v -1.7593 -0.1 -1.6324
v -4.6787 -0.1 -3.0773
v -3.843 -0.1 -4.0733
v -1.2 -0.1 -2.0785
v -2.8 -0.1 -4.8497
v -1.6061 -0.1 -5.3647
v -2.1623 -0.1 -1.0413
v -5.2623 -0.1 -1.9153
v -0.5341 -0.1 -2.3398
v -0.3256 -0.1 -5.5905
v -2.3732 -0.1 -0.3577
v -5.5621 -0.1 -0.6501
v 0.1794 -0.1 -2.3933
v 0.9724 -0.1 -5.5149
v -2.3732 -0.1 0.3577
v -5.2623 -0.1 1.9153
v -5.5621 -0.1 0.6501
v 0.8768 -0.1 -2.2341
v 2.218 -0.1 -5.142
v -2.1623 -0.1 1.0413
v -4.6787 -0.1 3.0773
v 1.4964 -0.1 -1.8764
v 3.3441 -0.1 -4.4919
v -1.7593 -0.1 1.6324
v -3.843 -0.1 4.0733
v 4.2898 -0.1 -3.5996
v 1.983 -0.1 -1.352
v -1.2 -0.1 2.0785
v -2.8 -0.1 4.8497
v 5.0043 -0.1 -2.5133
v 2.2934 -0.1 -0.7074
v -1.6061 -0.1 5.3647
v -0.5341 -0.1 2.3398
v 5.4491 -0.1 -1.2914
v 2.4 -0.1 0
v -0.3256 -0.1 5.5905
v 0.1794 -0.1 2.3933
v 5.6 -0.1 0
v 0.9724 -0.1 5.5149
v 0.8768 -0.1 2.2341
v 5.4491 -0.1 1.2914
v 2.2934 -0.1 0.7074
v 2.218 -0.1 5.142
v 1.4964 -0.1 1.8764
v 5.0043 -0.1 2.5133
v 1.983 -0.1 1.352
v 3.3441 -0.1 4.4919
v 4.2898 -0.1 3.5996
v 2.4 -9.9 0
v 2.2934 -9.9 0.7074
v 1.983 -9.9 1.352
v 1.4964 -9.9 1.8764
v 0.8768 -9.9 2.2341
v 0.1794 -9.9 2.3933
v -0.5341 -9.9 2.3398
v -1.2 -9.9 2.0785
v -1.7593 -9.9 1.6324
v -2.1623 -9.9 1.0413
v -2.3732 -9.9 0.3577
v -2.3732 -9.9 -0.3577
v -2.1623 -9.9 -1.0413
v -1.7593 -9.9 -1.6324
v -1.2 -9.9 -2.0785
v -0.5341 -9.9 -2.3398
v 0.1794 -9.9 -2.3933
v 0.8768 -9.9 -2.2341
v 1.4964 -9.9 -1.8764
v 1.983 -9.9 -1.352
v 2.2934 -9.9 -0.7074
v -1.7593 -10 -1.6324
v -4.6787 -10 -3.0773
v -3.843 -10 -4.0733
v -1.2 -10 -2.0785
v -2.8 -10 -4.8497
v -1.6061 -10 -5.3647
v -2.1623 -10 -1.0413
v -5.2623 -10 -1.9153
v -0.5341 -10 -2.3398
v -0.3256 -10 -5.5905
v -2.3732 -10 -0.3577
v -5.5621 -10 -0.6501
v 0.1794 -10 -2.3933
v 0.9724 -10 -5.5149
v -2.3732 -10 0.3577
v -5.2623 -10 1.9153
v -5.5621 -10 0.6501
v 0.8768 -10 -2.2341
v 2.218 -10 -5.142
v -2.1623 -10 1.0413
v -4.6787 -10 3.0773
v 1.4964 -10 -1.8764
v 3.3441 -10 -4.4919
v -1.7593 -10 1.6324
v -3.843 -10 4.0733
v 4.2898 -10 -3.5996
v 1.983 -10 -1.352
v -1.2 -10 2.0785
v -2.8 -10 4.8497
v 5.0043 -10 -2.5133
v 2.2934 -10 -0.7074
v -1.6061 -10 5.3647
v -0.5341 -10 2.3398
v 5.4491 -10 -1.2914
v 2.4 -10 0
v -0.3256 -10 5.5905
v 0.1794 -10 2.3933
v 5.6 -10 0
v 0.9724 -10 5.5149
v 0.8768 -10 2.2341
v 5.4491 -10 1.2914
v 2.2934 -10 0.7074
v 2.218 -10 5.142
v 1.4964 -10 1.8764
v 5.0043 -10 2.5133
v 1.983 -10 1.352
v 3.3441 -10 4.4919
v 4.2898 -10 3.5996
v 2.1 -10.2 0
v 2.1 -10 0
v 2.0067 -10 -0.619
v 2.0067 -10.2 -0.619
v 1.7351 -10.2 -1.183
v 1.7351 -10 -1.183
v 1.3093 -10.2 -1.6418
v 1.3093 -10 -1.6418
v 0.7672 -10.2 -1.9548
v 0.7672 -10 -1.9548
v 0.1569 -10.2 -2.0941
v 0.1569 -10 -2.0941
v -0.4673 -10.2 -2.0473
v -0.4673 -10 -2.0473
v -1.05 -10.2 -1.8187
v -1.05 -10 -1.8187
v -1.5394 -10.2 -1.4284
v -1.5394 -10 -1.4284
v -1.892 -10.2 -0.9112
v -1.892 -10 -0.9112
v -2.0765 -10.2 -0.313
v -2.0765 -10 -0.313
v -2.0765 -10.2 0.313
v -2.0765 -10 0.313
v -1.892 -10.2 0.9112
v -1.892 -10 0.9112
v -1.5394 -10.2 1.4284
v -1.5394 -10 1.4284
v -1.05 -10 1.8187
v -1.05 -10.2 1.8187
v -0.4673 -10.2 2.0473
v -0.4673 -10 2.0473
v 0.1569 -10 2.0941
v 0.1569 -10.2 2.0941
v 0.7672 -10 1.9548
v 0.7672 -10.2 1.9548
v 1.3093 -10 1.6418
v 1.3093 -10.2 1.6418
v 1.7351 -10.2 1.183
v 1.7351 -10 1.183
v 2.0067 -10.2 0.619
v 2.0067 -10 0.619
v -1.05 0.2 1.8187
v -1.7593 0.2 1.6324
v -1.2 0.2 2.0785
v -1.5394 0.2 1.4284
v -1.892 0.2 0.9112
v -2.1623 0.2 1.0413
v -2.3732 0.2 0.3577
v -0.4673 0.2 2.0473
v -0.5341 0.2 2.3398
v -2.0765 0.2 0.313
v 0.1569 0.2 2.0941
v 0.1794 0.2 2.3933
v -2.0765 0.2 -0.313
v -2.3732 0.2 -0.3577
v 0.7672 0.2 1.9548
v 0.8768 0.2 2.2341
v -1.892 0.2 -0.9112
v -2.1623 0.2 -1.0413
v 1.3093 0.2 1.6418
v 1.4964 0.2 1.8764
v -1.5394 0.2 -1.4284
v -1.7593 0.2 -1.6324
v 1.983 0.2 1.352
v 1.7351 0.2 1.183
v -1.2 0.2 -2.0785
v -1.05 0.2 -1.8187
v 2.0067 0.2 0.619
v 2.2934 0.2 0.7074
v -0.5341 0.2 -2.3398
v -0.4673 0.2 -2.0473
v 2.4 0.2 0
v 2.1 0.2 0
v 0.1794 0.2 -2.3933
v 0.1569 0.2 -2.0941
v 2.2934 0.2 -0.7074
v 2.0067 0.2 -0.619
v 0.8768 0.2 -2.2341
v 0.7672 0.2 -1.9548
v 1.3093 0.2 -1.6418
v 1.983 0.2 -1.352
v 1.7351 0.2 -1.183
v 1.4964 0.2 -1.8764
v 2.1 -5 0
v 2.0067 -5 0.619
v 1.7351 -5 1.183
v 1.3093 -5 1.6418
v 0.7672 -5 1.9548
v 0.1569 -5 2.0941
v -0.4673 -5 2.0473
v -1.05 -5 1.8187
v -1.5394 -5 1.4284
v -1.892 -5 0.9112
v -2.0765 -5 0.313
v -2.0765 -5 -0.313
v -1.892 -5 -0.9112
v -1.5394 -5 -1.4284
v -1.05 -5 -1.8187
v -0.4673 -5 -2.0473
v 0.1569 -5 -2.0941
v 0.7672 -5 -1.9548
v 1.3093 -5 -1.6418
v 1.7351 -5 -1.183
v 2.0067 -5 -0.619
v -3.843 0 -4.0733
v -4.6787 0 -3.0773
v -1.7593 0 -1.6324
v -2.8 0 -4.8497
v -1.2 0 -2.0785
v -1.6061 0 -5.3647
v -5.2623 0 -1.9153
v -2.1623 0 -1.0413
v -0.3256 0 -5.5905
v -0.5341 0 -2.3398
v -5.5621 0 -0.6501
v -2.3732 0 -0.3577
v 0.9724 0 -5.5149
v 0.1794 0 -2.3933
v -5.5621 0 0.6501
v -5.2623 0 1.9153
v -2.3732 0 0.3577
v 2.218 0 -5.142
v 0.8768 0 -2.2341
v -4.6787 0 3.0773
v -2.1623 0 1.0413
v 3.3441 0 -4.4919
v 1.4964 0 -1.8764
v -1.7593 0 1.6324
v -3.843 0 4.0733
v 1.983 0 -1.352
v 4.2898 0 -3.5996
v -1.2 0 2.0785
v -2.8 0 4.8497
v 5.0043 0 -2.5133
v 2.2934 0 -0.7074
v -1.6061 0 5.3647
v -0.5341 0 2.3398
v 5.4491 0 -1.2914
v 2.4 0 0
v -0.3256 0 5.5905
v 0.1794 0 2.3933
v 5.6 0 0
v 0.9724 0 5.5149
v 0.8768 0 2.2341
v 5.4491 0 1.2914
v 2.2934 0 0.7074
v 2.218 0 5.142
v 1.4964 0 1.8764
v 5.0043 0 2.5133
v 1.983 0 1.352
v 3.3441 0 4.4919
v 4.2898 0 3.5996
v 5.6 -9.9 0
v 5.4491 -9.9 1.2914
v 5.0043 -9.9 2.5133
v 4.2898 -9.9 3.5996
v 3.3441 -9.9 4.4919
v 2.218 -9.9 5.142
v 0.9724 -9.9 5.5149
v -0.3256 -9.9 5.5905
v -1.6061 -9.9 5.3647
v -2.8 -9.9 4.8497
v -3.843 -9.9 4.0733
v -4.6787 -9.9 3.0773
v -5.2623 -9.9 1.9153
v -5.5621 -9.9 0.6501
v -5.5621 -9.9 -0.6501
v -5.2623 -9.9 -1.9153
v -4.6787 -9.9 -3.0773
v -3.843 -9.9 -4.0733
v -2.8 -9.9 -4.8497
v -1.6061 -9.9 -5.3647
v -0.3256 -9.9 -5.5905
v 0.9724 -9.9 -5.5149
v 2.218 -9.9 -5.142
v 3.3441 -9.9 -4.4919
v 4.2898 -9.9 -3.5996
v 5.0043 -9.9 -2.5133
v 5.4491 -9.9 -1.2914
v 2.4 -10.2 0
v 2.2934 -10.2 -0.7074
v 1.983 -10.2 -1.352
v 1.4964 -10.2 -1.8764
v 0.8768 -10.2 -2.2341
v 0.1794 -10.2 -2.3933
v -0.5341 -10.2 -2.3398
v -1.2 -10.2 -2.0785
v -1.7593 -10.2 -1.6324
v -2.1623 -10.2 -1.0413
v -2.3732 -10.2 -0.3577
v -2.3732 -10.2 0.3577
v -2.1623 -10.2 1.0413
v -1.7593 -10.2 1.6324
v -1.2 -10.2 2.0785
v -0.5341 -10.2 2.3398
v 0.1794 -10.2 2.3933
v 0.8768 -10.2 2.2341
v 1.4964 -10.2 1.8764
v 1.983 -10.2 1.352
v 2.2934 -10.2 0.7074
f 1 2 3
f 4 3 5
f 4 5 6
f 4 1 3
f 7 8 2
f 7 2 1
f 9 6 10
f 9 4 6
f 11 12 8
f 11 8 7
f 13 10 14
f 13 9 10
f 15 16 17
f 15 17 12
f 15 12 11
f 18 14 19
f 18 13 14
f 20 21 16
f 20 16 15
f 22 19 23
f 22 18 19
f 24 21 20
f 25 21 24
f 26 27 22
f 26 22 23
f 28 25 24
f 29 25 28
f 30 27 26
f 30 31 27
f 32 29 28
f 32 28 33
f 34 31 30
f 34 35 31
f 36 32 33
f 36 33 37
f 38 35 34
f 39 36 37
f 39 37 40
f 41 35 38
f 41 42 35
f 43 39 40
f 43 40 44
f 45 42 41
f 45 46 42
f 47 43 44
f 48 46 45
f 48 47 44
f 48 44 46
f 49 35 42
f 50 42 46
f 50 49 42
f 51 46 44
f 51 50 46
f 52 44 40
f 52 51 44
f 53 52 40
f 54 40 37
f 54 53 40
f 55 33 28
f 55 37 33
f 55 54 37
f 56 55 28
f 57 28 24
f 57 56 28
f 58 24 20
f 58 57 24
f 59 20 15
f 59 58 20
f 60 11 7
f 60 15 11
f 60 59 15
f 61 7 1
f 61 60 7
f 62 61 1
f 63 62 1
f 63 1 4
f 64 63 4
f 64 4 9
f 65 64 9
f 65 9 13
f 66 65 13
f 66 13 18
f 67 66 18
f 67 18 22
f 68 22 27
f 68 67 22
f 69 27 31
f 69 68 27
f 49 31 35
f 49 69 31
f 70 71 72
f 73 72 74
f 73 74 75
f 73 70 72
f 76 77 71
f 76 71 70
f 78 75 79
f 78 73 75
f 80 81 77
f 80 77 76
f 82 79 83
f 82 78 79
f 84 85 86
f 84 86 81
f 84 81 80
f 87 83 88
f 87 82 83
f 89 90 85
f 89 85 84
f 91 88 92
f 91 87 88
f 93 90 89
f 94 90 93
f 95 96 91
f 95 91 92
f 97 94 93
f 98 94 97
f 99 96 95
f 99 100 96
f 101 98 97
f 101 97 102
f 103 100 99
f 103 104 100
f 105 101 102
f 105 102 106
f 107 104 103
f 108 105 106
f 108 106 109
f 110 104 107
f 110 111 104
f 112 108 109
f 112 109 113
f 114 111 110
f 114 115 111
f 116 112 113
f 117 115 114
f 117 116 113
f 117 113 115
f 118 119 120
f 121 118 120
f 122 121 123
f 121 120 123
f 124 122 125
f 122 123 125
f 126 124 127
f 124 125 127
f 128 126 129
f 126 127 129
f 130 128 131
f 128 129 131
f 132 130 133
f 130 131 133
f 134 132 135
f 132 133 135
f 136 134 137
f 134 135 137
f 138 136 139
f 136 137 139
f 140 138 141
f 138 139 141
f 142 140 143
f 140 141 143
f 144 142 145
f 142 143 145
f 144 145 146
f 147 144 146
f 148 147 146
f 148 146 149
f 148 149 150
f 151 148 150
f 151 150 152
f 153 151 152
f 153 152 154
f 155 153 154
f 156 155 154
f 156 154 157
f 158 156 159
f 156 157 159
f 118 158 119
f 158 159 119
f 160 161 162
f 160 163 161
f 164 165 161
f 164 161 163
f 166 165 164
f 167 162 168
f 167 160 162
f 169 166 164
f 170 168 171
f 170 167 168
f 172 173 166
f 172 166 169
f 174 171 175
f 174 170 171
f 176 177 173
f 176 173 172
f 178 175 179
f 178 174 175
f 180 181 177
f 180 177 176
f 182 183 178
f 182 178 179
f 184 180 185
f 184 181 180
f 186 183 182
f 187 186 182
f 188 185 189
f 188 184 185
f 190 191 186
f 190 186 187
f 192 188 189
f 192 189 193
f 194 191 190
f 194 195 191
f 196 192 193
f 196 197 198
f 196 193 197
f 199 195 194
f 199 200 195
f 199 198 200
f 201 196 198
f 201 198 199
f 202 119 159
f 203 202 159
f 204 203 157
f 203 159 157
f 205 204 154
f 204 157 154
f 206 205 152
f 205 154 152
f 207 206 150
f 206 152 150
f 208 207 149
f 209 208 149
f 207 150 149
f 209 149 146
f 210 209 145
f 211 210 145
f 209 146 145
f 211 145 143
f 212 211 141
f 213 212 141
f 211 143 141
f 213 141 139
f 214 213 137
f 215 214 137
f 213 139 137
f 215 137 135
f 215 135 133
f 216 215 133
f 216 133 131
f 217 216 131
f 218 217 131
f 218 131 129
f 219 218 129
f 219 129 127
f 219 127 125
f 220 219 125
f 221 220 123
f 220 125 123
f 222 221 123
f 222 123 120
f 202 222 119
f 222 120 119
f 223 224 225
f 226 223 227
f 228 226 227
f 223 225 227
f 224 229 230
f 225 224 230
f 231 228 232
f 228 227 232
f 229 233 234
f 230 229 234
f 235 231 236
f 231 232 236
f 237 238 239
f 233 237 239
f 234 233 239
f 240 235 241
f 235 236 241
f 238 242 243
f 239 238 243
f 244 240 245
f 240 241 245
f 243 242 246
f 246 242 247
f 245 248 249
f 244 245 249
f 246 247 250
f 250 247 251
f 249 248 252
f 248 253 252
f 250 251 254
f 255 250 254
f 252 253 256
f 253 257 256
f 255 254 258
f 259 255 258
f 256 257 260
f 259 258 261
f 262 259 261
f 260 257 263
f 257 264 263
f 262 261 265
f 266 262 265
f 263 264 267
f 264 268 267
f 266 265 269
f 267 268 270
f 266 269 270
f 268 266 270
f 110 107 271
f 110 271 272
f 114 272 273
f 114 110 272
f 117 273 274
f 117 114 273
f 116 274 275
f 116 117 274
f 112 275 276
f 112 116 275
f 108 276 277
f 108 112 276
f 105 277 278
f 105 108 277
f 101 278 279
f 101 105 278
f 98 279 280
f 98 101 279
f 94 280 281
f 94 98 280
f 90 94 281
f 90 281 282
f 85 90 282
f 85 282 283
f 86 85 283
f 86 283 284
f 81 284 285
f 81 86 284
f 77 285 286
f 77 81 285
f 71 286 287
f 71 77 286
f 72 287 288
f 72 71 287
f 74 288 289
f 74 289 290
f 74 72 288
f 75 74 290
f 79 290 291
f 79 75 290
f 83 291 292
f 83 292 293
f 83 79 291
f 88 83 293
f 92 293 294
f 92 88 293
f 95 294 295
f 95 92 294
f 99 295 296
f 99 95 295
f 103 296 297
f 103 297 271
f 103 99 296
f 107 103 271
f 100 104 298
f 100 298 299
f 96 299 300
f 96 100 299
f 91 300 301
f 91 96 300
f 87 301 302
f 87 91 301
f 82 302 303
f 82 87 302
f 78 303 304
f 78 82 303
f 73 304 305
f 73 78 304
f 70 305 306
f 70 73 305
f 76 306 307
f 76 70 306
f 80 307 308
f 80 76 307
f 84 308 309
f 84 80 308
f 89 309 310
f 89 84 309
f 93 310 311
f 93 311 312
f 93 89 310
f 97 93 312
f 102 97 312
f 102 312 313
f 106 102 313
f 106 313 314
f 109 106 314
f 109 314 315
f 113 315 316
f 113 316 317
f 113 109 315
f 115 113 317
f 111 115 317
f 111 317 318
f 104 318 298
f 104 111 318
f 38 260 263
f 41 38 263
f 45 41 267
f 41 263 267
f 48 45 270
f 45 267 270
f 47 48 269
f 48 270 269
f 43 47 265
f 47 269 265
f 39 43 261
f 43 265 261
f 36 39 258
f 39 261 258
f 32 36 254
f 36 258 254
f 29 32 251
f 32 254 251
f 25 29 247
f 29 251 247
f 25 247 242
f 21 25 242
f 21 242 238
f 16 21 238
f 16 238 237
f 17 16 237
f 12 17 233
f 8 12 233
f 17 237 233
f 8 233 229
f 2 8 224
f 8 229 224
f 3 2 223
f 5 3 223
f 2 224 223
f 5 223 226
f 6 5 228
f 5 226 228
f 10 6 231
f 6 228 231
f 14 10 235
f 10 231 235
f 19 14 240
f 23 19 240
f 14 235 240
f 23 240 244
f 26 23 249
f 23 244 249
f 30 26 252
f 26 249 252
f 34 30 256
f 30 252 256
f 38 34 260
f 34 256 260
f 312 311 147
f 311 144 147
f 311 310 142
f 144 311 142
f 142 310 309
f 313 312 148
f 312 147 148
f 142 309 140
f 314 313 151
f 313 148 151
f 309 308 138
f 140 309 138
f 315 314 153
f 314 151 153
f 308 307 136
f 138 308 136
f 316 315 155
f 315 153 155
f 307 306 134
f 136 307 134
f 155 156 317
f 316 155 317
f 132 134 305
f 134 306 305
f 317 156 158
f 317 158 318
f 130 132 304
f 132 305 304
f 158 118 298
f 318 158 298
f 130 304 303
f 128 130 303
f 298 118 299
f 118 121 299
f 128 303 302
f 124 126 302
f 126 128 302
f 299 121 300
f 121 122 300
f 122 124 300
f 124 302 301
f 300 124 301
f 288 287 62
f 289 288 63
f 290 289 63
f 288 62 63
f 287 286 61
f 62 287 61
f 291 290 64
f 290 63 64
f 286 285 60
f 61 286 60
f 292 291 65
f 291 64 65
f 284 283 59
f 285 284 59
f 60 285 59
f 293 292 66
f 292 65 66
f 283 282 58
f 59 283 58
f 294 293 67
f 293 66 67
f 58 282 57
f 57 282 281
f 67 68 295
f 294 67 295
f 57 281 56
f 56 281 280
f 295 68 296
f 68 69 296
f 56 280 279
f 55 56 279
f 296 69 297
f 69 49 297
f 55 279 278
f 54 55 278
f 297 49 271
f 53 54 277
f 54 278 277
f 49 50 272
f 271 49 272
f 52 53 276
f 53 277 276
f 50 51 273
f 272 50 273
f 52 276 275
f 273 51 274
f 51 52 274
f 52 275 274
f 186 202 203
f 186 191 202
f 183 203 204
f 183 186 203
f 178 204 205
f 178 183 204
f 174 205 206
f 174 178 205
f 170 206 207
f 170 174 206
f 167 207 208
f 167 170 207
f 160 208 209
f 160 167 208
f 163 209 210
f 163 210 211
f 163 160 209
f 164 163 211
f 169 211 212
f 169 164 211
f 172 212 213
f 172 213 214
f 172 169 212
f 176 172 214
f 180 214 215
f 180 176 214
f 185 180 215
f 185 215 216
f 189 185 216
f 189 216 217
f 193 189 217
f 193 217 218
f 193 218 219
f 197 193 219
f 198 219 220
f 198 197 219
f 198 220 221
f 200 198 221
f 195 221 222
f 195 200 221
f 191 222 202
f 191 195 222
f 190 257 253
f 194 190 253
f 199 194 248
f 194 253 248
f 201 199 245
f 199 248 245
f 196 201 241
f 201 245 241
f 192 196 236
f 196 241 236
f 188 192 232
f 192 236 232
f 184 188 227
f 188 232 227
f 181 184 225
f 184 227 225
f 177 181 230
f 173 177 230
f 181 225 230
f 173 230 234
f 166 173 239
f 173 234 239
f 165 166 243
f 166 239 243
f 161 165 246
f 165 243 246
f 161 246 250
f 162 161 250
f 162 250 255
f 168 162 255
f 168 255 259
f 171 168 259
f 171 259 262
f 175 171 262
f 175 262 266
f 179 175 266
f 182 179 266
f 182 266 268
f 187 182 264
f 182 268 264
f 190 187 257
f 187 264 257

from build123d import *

# Parameters (mm, degrees)
CROQUIS1_R              = 2.4
CROQUIS1_R_2            = 2.1
SALIENTE_EXTRUIR1_DEPTH = 0.2
CROQUIS3_R              = 5.6
CROQUIS3_R_2            = 2.3
SALIENTE_EXTRUIR2_DEPTH = 0.1
CROQUIS5_R              = 2.4
CROQUIS5_R_2            = 2.1
SALIENTE_EXTRUIR3_DEPTH = 5


with BuildPart() as part:
    # Croquis1 → Saliente-Extruir1 (new body)
    with BuildSketch(Plane(origin=(0, 0, 0), x_dir=(1, 0, 0), z_dir=(0, 1, 0))):
        Circle(CROQUIS1_R)
        Circle(CROQUIS1_R_2, mode=Mode.SUBTRACT)
    saliente_extruir1 = extrude(amount=SALIENTE_EXTRUIR1_DEPTH)



with BuildPart() as body_2:
    # Croquis3 → Saliente-Extruir2 (new body)
    with BuildSketch(Plane.XZ):
        Circle(CROQUIS3_R)
        Circle(CROQUIS3_R_2, mode=Mode.SUBTRACT)
    saliente_extruir2 = extrude(amount=SALIENTE_EXTRUIR2_DEPTH)


with BuildPart() as part_1:
    add(part.part)

    add(body_2.part)  # Saliente-Extruir3 merges body 2
    # Croquis5 → Saliente-Extruir3 (add)
    with BuildSketch(Plane.XZ):
        Circle(CROQUIS5_R)
        Circle(CROQUIS5_R_2, mode=Mode.SUBTRACT)
    saliente_extruir3 = extrude(amount=SALIENTE_EXTRUIR3_DEPTH)

    # Simetría2: Saliente-Extruir1, Saliente-Extruir2, Saliente-Extruir3 across plane
    add(saliente_extruir1.mirror(Plane(origin=(0, -5, 0), x_dir=(0, 0, 1), z_dir=(0, -1, 0))))
    add(saliente_extruir2.mirror(Plane(origin=(0, -5, 0), x_dir=(0, 0, 1), z_dir=(0, -1, 0))))
    add(saliente_extruir3.mirror(Plane(origin=(0, -5, 0), x_dir=(0, 0, 1), z_dir=(0, -1, 0))))


solid = part_1.part
